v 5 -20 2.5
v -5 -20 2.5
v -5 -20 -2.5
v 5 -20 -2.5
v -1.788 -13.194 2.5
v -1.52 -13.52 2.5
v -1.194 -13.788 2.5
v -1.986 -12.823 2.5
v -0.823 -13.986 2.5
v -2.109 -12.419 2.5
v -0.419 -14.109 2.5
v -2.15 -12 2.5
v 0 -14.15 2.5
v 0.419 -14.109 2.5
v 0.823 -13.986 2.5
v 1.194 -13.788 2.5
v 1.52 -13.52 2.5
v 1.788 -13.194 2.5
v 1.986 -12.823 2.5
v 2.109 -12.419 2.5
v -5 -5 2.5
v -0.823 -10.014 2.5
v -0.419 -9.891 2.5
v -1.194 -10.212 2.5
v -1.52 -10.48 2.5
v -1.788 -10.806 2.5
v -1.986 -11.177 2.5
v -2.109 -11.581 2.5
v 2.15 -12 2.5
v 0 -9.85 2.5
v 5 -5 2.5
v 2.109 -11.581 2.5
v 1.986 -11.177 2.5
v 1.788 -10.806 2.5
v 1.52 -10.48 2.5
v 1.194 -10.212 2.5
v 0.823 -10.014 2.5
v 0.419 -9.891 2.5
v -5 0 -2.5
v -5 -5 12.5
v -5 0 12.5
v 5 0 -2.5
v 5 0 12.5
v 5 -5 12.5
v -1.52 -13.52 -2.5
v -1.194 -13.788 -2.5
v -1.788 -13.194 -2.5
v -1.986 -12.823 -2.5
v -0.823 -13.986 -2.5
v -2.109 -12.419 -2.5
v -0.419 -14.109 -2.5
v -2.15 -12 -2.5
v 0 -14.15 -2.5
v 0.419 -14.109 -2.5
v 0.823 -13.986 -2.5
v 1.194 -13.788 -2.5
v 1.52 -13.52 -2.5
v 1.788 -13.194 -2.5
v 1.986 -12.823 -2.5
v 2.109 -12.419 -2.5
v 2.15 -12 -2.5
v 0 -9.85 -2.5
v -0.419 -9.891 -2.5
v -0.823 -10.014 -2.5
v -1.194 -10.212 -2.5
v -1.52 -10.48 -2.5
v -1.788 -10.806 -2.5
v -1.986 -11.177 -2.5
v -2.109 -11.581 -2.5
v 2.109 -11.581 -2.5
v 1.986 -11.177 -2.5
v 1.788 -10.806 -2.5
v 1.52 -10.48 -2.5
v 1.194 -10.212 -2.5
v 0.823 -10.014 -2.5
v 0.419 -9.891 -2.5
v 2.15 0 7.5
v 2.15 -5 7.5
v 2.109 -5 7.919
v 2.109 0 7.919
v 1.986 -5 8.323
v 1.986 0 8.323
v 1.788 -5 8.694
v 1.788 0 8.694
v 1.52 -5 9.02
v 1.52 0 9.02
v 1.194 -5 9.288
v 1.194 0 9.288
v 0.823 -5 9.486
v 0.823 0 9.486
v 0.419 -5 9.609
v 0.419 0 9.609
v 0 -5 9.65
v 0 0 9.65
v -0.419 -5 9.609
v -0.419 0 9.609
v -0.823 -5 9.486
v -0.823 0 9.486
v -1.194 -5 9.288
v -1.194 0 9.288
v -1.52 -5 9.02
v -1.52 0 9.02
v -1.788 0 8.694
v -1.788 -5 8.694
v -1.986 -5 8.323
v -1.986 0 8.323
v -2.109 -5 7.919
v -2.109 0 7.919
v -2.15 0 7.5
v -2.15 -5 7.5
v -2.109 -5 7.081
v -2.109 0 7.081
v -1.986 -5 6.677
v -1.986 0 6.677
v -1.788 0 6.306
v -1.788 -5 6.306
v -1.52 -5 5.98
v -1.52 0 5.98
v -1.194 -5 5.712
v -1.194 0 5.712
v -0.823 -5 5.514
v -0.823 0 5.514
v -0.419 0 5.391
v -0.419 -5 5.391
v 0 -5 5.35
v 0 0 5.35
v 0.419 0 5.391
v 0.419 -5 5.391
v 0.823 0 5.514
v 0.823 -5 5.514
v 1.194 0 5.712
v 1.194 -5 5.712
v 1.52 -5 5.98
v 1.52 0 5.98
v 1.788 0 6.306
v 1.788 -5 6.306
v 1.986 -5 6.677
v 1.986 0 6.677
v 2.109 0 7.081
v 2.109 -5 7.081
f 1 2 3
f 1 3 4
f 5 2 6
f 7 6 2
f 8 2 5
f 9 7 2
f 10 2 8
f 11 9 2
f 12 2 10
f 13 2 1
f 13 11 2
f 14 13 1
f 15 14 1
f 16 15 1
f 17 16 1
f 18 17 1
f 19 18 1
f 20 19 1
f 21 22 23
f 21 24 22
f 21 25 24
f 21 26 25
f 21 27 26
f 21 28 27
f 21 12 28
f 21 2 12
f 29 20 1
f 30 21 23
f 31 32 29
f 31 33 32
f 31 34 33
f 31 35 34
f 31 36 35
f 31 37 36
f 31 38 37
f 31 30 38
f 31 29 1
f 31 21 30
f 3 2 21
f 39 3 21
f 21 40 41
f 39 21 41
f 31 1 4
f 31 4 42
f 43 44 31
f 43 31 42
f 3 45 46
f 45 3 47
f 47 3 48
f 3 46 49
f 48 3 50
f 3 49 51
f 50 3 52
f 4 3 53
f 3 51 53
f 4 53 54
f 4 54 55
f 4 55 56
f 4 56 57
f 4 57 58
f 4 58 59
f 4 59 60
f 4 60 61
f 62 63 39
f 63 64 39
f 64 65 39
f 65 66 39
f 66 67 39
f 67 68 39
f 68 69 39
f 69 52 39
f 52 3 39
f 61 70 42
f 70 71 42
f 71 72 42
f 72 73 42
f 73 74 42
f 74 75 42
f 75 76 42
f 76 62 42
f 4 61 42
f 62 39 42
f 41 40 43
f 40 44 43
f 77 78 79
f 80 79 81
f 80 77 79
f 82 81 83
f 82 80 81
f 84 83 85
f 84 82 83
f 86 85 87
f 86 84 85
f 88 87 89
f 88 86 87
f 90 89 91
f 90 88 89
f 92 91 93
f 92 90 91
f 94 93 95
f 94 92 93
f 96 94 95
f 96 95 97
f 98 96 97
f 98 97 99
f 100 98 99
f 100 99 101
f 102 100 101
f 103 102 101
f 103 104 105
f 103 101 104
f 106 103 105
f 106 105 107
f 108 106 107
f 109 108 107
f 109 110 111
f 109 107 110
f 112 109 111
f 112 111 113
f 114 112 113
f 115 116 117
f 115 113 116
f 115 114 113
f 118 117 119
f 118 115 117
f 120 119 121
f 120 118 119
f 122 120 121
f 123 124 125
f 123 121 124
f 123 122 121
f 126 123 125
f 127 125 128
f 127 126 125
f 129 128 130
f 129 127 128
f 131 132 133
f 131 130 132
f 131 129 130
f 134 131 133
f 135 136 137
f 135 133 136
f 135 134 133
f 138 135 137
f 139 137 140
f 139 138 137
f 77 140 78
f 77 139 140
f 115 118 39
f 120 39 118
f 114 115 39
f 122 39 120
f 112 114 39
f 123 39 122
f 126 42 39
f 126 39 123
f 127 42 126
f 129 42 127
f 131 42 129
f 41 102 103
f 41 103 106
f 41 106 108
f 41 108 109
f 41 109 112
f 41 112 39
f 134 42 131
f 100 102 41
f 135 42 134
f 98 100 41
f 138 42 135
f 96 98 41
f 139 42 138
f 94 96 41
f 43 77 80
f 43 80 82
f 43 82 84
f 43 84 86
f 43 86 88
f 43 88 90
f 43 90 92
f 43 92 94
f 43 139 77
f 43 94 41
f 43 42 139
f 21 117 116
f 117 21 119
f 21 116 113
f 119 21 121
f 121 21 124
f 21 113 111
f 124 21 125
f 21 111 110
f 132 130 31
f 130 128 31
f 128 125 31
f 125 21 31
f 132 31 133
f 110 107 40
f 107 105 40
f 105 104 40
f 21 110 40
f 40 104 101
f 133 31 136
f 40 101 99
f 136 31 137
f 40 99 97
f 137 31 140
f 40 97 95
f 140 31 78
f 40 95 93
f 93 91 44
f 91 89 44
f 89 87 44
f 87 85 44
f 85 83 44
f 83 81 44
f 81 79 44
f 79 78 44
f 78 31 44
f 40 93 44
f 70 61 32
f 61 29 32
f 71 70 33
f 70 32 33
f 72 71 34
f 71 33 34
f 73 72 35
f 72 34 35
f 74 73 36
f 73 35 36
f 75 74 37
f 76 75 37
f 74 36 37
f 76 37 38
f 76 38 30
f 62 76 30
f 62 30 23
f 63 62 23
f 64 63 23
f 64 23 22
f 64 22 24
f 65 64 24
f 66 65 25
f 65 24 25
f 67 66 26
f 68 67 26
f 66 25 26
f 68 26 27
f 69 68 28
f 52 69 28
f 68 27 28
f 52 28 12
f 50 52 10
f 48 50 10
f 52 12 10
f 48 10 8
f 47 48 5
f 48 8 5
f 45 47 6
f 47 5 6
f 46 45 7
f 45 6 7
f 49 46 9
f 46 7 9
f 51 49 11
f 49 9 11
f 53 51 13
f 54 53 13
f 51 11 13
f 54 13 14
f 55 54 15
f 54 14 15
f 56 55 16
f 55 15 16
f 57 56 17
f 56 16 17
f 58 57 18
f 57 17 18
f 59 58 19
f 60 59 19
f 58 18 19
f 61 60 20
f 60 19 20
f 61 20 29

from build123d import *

# Parameters (mm, degrees)
F0_W     = 10
F0_H     = 5
F1_DEPTH = 20
F2_W     = 5
F2_H     = 10
F3_DEPTH = 5
F4_R     = 2.15
F5_DEPTH = 12.5
F6_R     = 2.15
F7_DEPTH = 5.1


with BuildPart() as f1:
    # F0 (on Front) → F1 (new body)
    with BuildSketch(Plane.XZ):
        Rectangle(F0_W, F0_H)
    extrude(amount=F1_DEPTH)

    # F2 (on Right) → F3 (join, symmetric)
    with BuildSketch(Plane.YZ):
        with Locations((-2.5, 7.5)):
            Rectangle(F2_W, F2_H)
    extrude(amount=F3_DEPTH, both=True)

    # F4 (on Top) → F5 (cut, symmetric)
    with BuildSketch(Plane.XY):
        with Locations((0, -12)):
            Circle(F4_R)
    extrude(amount=F5_DEPTH, both=True, mode=Mode.SUBTRACT)

    # F6 (on Front) → F7 (cut)
    with BuildSketch(Plane.XZ):
        with Locations((0, 7.5)):
            Circle(F6_R)
    extrude(amount=F7_DEPTH, mode=Mode.SUBTRACT)


solid = f1.part
